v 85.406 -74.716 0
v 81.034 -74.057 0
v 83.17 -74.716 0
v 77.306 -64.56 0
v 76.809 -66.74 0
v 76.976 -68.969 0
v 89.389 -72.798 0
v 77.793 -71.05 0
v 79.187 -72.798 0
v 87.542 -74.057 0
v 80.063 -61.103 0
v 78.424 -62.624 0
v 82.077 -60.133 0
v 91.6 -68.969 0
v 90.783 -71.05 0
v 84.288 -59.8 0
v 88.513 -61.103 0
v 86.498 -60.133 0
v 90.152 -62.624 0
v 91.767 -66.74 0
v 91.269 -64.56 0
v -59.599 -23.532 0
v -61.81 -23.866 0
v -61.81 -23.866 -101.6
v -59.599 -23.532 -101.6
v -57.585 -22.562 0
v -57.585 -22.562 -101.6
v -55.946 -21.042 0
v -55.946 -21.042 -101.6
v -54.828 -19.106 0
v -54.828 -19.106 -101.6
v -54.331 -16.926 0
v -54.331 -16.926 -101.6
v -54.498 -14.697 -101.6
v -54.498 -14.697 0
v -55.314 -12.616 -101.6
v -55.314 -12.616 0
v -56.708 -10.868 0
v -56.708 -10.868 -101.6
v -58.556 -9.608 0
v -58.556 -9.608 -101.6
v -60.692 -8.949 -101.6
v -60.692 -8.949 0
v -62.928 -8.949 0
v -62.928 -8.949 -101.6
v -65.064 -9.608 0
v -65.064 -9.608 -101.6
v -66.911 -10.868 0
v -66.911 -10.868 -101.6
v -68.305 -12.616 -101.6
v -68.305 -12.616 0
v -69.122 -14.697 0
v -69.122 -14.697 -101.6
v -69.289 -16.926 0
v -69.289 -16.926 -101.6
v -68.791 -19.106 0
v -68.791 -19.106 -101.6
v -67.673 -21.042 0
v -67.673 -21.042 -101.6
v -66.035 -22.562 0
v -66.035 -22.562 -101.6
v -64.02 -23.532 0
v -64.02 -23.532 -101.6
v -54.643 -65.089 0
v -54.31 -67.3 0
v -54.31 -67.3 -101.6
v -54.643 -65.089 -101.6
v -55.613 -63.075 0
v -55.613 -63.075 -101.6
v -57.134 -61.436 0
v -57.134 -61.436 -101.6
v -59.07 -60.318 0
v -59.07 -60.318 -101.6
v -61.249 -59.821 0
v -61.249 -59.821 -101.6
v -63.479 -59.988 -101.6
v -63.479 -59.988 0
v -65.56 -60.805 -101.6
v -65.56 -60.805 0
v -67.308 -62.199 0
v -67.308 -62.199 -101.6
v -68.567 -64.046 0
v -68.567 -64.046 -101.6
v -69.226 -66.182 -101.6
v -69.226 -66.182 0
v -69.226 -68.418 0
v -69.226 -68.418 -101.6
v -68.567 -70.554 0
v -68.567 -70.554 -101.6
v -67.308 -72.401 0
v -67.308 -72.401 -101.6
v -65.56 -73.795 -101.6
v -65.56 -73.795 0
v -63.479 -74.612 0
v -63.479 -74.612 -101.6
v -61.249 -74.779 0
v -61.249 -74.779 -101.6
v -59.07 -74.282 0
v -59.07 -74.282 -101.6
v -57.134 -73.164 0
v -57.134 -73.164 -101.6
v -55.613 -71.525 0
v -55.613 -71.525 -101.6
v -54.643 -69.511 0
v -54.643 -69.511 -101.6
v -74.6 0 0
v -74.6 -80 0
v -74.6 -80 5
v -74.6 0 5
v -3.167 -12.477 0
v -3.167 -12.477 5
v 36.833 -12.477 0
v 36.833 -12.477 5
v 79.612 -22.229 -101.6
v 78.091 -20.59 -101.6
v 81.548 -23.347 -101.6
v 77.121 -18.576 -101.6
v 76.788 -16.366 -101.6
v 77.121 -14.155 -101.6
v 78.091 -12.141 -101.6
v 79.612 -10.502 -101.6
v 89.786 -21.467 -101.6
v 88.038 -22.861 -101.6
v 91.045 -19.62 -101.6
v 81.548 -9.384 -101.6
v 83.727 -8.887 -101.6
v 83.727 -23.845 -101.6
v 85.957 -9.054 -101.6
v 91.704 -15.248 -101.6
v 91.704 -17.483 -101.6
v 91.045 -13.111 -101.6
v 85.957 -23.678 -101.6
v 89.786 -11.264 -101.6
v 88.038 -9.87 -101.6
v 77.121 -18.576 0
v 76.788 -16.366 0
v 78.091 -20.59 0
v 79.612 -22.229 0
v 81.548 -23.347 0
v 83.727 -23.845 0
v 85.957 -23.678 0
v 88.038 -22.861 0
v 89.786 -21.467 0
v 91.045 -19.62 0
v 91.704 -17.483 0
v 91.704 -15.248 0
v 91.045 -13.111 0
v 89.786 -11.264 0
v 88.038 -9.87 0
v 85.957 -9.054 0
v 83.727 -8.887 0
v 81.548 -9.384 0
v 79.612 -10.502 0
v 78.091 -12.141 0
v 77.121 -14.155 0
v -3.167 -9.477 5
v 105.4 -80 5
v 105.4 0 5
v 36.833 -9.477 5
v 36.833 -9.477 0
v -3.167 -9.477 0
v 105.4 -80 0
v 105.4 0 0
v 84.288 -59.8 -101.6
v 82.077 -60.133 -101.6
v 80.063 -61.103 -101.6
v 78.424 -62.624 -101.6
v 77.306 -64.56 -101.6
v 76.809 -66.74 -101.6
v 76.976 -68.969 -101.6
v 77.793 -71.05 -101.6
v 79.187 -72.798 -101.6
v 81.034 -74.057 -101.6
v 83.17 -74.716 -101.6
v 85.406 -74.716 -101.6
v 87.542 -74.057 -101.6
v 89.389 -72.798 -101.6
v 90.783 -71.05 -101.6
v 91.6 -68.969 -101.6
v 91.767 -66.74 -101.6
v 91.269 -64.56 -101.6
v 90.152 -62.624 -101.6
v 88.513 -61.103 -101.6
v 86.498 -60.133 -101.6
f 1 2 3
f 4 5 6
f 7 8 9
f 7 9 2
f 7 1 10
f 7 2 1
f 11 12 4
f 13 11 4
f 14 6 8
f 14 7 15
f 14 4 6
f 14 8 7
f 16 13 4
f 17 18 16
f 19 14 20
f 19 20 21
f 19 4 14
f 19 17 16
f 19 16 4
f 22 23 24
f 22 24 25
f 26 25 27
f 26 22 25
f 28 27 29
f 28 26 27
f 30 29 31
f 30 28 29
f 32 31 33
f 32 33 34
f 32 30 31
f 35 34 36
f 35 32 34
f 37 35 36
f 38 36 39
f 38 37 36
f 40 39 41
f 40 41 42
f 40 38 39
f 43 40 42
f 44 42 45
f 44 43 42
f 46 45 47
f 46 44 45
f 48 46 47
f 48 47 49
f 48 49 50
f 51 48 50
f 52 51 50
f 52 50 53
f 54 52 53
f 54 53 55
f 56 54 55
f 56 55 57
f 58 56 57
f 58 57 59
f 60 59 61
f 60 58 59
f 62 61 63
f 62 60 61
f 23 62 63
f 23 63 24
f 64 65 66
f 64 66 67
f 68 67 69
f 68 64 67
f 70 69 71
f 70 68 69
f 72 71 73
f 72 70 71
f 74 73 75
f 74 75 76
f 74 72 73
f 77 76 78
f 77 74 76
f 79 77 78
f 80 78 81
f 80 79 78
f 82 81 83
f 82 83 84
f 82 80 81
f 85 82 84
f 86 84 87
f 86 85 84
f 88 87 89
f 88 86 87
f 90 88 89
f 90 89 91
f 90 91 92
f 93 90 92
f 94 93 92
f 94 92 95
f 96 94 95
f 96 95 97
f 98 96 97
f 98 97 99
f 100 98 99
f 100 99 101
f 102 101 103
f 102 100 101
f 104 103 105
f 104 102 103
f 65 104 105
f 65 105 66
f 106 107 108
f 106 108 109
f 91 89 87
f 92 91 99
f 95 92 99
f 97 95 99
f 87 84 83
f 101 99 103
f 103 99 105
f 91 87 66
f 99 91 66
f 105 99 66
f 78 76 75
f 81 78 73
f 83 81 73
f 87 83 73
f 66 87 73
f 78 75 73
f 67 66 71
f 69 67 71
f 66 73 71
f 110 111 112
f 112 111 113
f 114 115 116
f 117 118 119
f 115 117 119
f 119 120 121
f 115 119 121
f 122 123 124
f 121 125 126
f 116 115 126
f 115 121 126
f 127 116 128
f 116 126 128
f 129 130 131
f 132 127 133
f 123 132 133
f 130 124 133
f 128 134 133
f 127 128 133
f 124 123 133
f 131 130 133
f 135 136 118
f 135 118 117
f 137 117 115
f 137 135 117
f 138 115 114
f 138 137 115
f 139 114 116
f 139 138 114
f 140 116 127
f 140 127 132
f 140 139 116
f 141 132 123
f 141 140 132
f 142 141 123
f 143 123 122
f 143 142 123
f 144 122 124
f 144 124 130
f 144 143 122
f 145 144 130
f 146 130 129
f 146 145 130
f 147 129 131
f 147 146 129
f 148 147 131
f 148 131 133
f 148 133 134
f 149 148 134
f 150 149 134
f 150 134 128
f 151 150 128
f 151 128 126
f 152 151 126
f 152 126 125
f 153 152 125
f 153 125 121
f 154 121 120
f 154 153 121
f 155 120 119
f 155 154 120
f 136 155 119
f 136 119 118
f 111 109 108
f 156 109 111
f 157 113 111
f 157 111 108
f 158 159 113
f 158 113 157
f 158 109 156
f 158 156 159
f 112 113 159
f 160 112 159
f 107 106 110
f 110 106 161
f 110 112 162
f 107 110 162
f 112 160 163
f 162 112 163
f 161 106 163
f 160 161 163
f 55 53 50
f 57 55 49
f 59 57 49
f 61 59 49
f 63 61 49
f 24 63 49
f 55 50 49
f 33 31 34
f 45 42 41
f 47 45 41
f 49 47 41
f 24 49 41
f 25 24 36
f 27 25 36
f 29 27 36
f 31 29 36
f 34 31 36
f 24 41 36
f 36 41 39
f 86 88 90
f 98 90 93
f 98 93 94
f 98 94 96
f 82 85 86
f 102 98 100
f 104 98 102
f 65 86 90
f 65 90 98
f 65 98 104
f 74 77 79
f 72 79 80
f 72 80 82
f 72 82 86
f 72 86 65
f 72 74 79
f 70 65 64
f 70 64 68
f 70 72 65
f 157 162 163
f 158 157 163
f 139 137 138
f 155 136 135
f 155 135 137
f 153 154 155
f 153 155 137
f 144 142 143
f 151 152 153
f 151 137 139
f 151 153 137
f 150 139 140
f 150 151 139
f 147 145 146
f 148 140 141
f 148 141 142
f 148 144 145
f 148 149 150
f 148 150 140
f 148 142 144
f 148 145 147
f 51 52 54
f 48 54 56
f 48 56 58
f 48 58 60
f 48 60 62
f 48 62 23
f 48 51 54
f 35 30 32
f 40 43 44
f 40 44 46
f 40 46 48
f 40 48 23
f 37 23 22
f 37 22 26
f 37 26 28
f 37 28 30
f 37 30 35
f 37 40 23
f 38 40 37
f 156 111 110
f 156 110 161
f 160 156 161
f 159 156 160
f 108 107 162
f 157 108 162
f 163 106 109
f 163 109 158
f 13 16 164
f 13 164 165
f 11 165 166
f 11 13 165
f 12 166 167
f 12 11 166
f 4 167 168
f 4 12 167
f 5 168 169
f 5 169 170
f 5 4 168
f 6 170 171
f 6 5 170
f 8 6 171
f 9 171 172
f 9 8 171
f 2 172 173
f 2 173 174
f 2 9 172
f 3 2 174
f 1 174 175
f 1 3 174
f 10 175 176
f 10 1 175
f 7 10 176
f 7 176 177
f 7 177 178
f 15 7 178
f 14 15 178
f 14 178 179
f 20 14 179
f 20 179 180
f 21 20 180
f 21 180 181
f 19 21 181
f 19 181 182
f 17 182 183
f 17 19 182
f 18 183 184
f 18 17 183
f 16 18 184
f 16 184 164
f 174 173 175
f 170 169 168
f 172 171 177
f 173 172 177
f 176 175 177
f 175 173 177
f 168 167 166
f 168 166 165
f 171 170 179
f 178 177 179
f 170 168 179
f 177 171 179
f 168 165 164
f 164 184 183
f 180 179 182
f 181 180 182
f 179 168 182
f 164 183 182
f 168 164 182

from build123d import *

# Parameters (mm, degrees)
F1_DEPTH = 101.6
F0_W     = 180
F0_H     = 80
F2_DEPTH = 5
F3_W     = 40
F3_H     = 3
F4_DEPTH = 25.4


with BuildPart() as f1:
    # F0 (on Top) → F1 (new body)
    with BuildSketch(Plane.XY):
        with BuildLine():
            ThreePointArc((-61.8096877346, -59.8), (-67.1129885935, -72.6033008589), (-54.3096877346, -67.3))
            Line((-54.3096877346, -67.3), (-61.8096877346, -67.3))
            Line((-61.8096877346, -67.3), (-61.8096877346, -59.8))
        make_face()
        with BuildLine():
            Line((-61.8096877346, -67.3), (-54.3096877346, -67.3))
            ThreePointArc((-54.3096877346, -67.3), (-56.5063868757, -61.9966991411), (-61.8096877346, -59.8))
            Line((-61.8096877346, -59.8), (-61.8096877346, -67.3))
        make_face()
    extrude(amount=-F1_DEPTH)


with BuildPart() as f1b:
    # F0 (on Top) → F1, piece 2 (new body)
    with BuildSketch(Plane.XY):
        with BuildLine():
            Line((84.2878028534, -67.3), (76.7878028534, -67.3))
            ThreePointArc((76.7878028534, -67.3), (84.2878028534, -74.8), (91.7878028534, -67.3))
            ThreePointArc((91.7878028534, -67.3), (89.5911037123, -61.9966991411), (84.2878028534, -59.8))
            Line((84.2878028534, -59.8), (84.2878028534, -67.3))
        make_face()
        with BuildLine():
            ThreePointArc((84.2878028534, -59.8), (78.9845019945, -61.9966991411), (76.7878028534, -67.3))
            Line((76.7878028534, -67.3), (84.2878028534, -67.3))
            Line((84.2878028534, -67.3), (84.2878028534, -59.8))
        make_face()
    extrude(amount=-F1_DEPTH)


with BuildPart() as f1c:
    # F0 (on Top) → F1, piece 3 (new body)
    with BuildSketch(Plane.XY):
        with BuildLine():
            Line((84.2878028534, -16.3655914366), (84.2878028534, -23.8655914366))
            ThreePointArc((84.2878028534, -23.8655914366), (89.5911037123, -21.6688922955), (91.7878028534, -16.3655914366))
            ThreePointArc((91.7878028534, -16.3655914366), (84.2878028534, -8.8655914366), (76.7878028534, -16.3655914366))
            Line((76.7878028534, -16.3655914366), (84.2878028534, -16.3655914366))
        make_face()
        with BuildLine():
            ThreePointArc((76.7878028534, -16.3655914366), (78.9845019945, -21.6688922955), (84.2878028534, -23.8655914366))
            Line((84.2878028534, -23.8655914366), (84.2878028534, -16.3655914366))
            Line((84.2878028534, -16.3655914366), (76.7878028534, -16.3655914366))
        make_face()
    extrude(amount=-F1_DEPTH)


with BuildPart() as f1d:
    # F0 (on Top) → F1, piece 4 (new body)
    with BuildSketch(Plane.XY):
        with BuildLine():
            ThreePointArc((-54.3096877346, -16.3655914366), (-67.1129885935, -11.0622905777), (-61.8096877346, -23.8655914366))
            Line((-61.8096877346, -23.8655914366), (-61.8096877346, -16.3655914366))
            Line((-61.8096877346, -16.3655914366), (-54.3096877346, -16.3655914366))
        make_face()
        with BuildLine():
            Line((-61.8096877346, -16.3655914366), (-61.8096877346, -23.8655914366))
            ThreePointArc((-61.8096877346, -23.8655914366), (-56.5063868757, -21.6688922955), (-54.3096877346, -16.3655914366))
            Line((-54.3096877346, -16.3655914366), (-61.8096877346, -16.3655914366))
        make_face()
    extrude(amount=-F1_DEPTH)


with BuildPart() as f2:
    # F0 (on Top) → F2 (new body)
    with BuildSketch(Plane.XY):
        with Locations((15.3998310249, -40)):
            Rectangle(F0_W, F0_H)
        with BuildLine():
            Line((76.7878028534, -67.3), (-54.3096877346, -67.3))
            ThreePointArc((-54.3096877346, -67.3), (-67.1129885935, -72.6033008589), (-61.8096877346, -59.8))
            Line((-61.8096877346, -59.8), (-61.8096877346, -23.8655914366))
            ThreePointArc((-61.8096877346, -23.8655914366), (-67.1129885935, -11.0622905777), (-54.3096877346, -16.3655914366))
            Line((-54.3096877346, -16.3655914366), (76.7878028534, -16.3655914366))
            ThreePointArc((76.7878028534, -16.3655914366), (84.2878028534, -8.8655914366), (91.7878028534, -16.3655914366))
            ThreePointArc((91.7878028534, -16.3655914366), (89.5911037123, -21.6688922955), (84.2878028534, -23.8655914366))
            Line((84.2878028534, -23.8655914366), (84.2878028534, -59.8))
            ThreePointArc((84.2878028534, -59.8), (89.5911037123, -61.9966991411), (91.7878028534, -67.3))
            ThreePointArc((91.7878028534, -67.3), (84.2878028534, -74.8), (76.7878028534, -67.3))
        make_face(mode=Mode.SUBTRACT)
        with BuildLine():
            ThreePointArc((-54.3096877346, -16.3655914366), (-67.1129885935, -11.0622905777), (-61.8096877346, -23.8655914366))
            Line((-61.8096877346, -23.8655914366), (-61.8096877346, -16.3655914366))
            Line((-61.8096877346, -16.3655914366), (-54.3096877346, -16.3655914366))
        make_face()
        with BuildLine():
            ThreePointArc((76.7878028534, -16.3655914366), (78.9845019945, -21.6688922955), (84.2878028534, -23.8655914366))
            Line((84.2878028534, -23.8655914366), (84.2878028534, -16.3655914366))
            Line((84.2878028534, -16.3655914366), (76.7878028534, -16.3655914366))
        make_face()
        with BuildLine():
            Line((84.2878028534, -67.3), (76.7878028534, -67.3))
            ThreePointArc((76.7878028534, -67.3), (84.2878028534, -74.8), (91.7878028534, -67.3))
            ThreePointArc((91.7878028534, -67.3), (89.5911037123, -61.9966991411), (84.2878028534, -59.8))
            Line((84.2878028534, -59.8), (84.2878028534, -67.3))
        make_face()
        with BuildLine():
            Line((-61.8096877346, -67.3), (-54.3096877346, -67.3))
            ThreePointArc((-54.3096877346, -67.3), (-56.5063868757, -61.9966991411), (-61.8096877346, -59.8))
            Line((-61.8096877346, -59.8), (-61.8096877346, -67.3))
        make_face()
        with BuildLine():
            Line((84.2878028534, -16.3655914366), (84.2878028534, -23.8655914366))
            ThreePointArc((84.2878028534, -23.8655914366), (89.5911037123, -21.6688922955), (91.7878028534, -16.3655914366))
            ThreePointArc((91.7878028534, -16.3655914366), (84.2878028534, -8.8655914366), (76.7878028534, -16.3655914366))
            Line((76.7878028534, -16.3655914366), (84.2878028534, -16.3655914366))
        make_face()
        with BuildLine():
            ThreePointArc((-61.8096877346, -59.8), (-67.1129885935, -72.6033008589), (-54.3096877346, -67.3))
            Line((-54.3096877346, -67.3), (-61.8096877346, -67.3))
            Line((-61.8096877346, -67.3), (-61.8096877346, -59.8))
        make_face()
        with BuildLine():
            Line((-61.8096877346, -16.3655914366), (-61.8096877346, -23.8655914366))
            ThreePointArc((-61.8096877346, -23.8655914366), (-56.5063868757, -21.6688922955), (-54.3096877346, -16.3655914366))
            Line((-54.3096877346, -16.3655914366), (-61.8096877346, -16.3655914366))
        make_face()
        with BuildLine():
            ThreePointArc((84.2878028534, -59.8), (78.9845019945, -61.9966991411), (76.7878028534, -67.3))
            Line((76.7878028534, -67.3), (84.2878028534, -67.3))
            Line((84.2878028534, -67.3), (84.2878028534, -59.8))
        make_face()
        with BuildLine():
            ThreePointArc((-61.8096877346, -59.8), (-56.5063868757, -61.9966991411), (-54.3096877346, -67.3))
            Line((-54.3096877346, -67.3), (76.7878028534, -67.3))
            ThreePointArc((76.7878028534, -67.3), (78.9845019945, -61.9966991411), (84.2878028534, -59.8))
            Line((84.2878028534, -59.8), (84.2878028534, -23.8655914366))
            ThreePointArc((84.2878028534, -23.8655914366), (78.9845019945, -21.6688922955), (76.7878028534, -16.3655914366))
            Line((76.7878028534, -16.3655914366), (-54.3096877346, -16.3655914366))
            ThreePointArc((-54.3096877346, -16.3655914366), (-56.5063868757, -21.6688922955), (-61.8096877346, -23.8655914366))
            Line((-61.8096877346, -23.8655914366), (-61.8096877346, -59.8))
        make_face()
    extrude(amount=F2_DEPTH)

    # F3 (on face) → F4 (cut)
    with BuildSketch(Plane.XY.offset(5)):
        with Locations((16.8331203902, -10.9774959274)):
            Rectangle(F3_W, F3_H)
    extrude(amount=-F4_DEPTH, mode=Mode.SUBTRACT)


solid = Compound([f1.part, f1b.part, f1c.part, f1d.part, f2.part])
